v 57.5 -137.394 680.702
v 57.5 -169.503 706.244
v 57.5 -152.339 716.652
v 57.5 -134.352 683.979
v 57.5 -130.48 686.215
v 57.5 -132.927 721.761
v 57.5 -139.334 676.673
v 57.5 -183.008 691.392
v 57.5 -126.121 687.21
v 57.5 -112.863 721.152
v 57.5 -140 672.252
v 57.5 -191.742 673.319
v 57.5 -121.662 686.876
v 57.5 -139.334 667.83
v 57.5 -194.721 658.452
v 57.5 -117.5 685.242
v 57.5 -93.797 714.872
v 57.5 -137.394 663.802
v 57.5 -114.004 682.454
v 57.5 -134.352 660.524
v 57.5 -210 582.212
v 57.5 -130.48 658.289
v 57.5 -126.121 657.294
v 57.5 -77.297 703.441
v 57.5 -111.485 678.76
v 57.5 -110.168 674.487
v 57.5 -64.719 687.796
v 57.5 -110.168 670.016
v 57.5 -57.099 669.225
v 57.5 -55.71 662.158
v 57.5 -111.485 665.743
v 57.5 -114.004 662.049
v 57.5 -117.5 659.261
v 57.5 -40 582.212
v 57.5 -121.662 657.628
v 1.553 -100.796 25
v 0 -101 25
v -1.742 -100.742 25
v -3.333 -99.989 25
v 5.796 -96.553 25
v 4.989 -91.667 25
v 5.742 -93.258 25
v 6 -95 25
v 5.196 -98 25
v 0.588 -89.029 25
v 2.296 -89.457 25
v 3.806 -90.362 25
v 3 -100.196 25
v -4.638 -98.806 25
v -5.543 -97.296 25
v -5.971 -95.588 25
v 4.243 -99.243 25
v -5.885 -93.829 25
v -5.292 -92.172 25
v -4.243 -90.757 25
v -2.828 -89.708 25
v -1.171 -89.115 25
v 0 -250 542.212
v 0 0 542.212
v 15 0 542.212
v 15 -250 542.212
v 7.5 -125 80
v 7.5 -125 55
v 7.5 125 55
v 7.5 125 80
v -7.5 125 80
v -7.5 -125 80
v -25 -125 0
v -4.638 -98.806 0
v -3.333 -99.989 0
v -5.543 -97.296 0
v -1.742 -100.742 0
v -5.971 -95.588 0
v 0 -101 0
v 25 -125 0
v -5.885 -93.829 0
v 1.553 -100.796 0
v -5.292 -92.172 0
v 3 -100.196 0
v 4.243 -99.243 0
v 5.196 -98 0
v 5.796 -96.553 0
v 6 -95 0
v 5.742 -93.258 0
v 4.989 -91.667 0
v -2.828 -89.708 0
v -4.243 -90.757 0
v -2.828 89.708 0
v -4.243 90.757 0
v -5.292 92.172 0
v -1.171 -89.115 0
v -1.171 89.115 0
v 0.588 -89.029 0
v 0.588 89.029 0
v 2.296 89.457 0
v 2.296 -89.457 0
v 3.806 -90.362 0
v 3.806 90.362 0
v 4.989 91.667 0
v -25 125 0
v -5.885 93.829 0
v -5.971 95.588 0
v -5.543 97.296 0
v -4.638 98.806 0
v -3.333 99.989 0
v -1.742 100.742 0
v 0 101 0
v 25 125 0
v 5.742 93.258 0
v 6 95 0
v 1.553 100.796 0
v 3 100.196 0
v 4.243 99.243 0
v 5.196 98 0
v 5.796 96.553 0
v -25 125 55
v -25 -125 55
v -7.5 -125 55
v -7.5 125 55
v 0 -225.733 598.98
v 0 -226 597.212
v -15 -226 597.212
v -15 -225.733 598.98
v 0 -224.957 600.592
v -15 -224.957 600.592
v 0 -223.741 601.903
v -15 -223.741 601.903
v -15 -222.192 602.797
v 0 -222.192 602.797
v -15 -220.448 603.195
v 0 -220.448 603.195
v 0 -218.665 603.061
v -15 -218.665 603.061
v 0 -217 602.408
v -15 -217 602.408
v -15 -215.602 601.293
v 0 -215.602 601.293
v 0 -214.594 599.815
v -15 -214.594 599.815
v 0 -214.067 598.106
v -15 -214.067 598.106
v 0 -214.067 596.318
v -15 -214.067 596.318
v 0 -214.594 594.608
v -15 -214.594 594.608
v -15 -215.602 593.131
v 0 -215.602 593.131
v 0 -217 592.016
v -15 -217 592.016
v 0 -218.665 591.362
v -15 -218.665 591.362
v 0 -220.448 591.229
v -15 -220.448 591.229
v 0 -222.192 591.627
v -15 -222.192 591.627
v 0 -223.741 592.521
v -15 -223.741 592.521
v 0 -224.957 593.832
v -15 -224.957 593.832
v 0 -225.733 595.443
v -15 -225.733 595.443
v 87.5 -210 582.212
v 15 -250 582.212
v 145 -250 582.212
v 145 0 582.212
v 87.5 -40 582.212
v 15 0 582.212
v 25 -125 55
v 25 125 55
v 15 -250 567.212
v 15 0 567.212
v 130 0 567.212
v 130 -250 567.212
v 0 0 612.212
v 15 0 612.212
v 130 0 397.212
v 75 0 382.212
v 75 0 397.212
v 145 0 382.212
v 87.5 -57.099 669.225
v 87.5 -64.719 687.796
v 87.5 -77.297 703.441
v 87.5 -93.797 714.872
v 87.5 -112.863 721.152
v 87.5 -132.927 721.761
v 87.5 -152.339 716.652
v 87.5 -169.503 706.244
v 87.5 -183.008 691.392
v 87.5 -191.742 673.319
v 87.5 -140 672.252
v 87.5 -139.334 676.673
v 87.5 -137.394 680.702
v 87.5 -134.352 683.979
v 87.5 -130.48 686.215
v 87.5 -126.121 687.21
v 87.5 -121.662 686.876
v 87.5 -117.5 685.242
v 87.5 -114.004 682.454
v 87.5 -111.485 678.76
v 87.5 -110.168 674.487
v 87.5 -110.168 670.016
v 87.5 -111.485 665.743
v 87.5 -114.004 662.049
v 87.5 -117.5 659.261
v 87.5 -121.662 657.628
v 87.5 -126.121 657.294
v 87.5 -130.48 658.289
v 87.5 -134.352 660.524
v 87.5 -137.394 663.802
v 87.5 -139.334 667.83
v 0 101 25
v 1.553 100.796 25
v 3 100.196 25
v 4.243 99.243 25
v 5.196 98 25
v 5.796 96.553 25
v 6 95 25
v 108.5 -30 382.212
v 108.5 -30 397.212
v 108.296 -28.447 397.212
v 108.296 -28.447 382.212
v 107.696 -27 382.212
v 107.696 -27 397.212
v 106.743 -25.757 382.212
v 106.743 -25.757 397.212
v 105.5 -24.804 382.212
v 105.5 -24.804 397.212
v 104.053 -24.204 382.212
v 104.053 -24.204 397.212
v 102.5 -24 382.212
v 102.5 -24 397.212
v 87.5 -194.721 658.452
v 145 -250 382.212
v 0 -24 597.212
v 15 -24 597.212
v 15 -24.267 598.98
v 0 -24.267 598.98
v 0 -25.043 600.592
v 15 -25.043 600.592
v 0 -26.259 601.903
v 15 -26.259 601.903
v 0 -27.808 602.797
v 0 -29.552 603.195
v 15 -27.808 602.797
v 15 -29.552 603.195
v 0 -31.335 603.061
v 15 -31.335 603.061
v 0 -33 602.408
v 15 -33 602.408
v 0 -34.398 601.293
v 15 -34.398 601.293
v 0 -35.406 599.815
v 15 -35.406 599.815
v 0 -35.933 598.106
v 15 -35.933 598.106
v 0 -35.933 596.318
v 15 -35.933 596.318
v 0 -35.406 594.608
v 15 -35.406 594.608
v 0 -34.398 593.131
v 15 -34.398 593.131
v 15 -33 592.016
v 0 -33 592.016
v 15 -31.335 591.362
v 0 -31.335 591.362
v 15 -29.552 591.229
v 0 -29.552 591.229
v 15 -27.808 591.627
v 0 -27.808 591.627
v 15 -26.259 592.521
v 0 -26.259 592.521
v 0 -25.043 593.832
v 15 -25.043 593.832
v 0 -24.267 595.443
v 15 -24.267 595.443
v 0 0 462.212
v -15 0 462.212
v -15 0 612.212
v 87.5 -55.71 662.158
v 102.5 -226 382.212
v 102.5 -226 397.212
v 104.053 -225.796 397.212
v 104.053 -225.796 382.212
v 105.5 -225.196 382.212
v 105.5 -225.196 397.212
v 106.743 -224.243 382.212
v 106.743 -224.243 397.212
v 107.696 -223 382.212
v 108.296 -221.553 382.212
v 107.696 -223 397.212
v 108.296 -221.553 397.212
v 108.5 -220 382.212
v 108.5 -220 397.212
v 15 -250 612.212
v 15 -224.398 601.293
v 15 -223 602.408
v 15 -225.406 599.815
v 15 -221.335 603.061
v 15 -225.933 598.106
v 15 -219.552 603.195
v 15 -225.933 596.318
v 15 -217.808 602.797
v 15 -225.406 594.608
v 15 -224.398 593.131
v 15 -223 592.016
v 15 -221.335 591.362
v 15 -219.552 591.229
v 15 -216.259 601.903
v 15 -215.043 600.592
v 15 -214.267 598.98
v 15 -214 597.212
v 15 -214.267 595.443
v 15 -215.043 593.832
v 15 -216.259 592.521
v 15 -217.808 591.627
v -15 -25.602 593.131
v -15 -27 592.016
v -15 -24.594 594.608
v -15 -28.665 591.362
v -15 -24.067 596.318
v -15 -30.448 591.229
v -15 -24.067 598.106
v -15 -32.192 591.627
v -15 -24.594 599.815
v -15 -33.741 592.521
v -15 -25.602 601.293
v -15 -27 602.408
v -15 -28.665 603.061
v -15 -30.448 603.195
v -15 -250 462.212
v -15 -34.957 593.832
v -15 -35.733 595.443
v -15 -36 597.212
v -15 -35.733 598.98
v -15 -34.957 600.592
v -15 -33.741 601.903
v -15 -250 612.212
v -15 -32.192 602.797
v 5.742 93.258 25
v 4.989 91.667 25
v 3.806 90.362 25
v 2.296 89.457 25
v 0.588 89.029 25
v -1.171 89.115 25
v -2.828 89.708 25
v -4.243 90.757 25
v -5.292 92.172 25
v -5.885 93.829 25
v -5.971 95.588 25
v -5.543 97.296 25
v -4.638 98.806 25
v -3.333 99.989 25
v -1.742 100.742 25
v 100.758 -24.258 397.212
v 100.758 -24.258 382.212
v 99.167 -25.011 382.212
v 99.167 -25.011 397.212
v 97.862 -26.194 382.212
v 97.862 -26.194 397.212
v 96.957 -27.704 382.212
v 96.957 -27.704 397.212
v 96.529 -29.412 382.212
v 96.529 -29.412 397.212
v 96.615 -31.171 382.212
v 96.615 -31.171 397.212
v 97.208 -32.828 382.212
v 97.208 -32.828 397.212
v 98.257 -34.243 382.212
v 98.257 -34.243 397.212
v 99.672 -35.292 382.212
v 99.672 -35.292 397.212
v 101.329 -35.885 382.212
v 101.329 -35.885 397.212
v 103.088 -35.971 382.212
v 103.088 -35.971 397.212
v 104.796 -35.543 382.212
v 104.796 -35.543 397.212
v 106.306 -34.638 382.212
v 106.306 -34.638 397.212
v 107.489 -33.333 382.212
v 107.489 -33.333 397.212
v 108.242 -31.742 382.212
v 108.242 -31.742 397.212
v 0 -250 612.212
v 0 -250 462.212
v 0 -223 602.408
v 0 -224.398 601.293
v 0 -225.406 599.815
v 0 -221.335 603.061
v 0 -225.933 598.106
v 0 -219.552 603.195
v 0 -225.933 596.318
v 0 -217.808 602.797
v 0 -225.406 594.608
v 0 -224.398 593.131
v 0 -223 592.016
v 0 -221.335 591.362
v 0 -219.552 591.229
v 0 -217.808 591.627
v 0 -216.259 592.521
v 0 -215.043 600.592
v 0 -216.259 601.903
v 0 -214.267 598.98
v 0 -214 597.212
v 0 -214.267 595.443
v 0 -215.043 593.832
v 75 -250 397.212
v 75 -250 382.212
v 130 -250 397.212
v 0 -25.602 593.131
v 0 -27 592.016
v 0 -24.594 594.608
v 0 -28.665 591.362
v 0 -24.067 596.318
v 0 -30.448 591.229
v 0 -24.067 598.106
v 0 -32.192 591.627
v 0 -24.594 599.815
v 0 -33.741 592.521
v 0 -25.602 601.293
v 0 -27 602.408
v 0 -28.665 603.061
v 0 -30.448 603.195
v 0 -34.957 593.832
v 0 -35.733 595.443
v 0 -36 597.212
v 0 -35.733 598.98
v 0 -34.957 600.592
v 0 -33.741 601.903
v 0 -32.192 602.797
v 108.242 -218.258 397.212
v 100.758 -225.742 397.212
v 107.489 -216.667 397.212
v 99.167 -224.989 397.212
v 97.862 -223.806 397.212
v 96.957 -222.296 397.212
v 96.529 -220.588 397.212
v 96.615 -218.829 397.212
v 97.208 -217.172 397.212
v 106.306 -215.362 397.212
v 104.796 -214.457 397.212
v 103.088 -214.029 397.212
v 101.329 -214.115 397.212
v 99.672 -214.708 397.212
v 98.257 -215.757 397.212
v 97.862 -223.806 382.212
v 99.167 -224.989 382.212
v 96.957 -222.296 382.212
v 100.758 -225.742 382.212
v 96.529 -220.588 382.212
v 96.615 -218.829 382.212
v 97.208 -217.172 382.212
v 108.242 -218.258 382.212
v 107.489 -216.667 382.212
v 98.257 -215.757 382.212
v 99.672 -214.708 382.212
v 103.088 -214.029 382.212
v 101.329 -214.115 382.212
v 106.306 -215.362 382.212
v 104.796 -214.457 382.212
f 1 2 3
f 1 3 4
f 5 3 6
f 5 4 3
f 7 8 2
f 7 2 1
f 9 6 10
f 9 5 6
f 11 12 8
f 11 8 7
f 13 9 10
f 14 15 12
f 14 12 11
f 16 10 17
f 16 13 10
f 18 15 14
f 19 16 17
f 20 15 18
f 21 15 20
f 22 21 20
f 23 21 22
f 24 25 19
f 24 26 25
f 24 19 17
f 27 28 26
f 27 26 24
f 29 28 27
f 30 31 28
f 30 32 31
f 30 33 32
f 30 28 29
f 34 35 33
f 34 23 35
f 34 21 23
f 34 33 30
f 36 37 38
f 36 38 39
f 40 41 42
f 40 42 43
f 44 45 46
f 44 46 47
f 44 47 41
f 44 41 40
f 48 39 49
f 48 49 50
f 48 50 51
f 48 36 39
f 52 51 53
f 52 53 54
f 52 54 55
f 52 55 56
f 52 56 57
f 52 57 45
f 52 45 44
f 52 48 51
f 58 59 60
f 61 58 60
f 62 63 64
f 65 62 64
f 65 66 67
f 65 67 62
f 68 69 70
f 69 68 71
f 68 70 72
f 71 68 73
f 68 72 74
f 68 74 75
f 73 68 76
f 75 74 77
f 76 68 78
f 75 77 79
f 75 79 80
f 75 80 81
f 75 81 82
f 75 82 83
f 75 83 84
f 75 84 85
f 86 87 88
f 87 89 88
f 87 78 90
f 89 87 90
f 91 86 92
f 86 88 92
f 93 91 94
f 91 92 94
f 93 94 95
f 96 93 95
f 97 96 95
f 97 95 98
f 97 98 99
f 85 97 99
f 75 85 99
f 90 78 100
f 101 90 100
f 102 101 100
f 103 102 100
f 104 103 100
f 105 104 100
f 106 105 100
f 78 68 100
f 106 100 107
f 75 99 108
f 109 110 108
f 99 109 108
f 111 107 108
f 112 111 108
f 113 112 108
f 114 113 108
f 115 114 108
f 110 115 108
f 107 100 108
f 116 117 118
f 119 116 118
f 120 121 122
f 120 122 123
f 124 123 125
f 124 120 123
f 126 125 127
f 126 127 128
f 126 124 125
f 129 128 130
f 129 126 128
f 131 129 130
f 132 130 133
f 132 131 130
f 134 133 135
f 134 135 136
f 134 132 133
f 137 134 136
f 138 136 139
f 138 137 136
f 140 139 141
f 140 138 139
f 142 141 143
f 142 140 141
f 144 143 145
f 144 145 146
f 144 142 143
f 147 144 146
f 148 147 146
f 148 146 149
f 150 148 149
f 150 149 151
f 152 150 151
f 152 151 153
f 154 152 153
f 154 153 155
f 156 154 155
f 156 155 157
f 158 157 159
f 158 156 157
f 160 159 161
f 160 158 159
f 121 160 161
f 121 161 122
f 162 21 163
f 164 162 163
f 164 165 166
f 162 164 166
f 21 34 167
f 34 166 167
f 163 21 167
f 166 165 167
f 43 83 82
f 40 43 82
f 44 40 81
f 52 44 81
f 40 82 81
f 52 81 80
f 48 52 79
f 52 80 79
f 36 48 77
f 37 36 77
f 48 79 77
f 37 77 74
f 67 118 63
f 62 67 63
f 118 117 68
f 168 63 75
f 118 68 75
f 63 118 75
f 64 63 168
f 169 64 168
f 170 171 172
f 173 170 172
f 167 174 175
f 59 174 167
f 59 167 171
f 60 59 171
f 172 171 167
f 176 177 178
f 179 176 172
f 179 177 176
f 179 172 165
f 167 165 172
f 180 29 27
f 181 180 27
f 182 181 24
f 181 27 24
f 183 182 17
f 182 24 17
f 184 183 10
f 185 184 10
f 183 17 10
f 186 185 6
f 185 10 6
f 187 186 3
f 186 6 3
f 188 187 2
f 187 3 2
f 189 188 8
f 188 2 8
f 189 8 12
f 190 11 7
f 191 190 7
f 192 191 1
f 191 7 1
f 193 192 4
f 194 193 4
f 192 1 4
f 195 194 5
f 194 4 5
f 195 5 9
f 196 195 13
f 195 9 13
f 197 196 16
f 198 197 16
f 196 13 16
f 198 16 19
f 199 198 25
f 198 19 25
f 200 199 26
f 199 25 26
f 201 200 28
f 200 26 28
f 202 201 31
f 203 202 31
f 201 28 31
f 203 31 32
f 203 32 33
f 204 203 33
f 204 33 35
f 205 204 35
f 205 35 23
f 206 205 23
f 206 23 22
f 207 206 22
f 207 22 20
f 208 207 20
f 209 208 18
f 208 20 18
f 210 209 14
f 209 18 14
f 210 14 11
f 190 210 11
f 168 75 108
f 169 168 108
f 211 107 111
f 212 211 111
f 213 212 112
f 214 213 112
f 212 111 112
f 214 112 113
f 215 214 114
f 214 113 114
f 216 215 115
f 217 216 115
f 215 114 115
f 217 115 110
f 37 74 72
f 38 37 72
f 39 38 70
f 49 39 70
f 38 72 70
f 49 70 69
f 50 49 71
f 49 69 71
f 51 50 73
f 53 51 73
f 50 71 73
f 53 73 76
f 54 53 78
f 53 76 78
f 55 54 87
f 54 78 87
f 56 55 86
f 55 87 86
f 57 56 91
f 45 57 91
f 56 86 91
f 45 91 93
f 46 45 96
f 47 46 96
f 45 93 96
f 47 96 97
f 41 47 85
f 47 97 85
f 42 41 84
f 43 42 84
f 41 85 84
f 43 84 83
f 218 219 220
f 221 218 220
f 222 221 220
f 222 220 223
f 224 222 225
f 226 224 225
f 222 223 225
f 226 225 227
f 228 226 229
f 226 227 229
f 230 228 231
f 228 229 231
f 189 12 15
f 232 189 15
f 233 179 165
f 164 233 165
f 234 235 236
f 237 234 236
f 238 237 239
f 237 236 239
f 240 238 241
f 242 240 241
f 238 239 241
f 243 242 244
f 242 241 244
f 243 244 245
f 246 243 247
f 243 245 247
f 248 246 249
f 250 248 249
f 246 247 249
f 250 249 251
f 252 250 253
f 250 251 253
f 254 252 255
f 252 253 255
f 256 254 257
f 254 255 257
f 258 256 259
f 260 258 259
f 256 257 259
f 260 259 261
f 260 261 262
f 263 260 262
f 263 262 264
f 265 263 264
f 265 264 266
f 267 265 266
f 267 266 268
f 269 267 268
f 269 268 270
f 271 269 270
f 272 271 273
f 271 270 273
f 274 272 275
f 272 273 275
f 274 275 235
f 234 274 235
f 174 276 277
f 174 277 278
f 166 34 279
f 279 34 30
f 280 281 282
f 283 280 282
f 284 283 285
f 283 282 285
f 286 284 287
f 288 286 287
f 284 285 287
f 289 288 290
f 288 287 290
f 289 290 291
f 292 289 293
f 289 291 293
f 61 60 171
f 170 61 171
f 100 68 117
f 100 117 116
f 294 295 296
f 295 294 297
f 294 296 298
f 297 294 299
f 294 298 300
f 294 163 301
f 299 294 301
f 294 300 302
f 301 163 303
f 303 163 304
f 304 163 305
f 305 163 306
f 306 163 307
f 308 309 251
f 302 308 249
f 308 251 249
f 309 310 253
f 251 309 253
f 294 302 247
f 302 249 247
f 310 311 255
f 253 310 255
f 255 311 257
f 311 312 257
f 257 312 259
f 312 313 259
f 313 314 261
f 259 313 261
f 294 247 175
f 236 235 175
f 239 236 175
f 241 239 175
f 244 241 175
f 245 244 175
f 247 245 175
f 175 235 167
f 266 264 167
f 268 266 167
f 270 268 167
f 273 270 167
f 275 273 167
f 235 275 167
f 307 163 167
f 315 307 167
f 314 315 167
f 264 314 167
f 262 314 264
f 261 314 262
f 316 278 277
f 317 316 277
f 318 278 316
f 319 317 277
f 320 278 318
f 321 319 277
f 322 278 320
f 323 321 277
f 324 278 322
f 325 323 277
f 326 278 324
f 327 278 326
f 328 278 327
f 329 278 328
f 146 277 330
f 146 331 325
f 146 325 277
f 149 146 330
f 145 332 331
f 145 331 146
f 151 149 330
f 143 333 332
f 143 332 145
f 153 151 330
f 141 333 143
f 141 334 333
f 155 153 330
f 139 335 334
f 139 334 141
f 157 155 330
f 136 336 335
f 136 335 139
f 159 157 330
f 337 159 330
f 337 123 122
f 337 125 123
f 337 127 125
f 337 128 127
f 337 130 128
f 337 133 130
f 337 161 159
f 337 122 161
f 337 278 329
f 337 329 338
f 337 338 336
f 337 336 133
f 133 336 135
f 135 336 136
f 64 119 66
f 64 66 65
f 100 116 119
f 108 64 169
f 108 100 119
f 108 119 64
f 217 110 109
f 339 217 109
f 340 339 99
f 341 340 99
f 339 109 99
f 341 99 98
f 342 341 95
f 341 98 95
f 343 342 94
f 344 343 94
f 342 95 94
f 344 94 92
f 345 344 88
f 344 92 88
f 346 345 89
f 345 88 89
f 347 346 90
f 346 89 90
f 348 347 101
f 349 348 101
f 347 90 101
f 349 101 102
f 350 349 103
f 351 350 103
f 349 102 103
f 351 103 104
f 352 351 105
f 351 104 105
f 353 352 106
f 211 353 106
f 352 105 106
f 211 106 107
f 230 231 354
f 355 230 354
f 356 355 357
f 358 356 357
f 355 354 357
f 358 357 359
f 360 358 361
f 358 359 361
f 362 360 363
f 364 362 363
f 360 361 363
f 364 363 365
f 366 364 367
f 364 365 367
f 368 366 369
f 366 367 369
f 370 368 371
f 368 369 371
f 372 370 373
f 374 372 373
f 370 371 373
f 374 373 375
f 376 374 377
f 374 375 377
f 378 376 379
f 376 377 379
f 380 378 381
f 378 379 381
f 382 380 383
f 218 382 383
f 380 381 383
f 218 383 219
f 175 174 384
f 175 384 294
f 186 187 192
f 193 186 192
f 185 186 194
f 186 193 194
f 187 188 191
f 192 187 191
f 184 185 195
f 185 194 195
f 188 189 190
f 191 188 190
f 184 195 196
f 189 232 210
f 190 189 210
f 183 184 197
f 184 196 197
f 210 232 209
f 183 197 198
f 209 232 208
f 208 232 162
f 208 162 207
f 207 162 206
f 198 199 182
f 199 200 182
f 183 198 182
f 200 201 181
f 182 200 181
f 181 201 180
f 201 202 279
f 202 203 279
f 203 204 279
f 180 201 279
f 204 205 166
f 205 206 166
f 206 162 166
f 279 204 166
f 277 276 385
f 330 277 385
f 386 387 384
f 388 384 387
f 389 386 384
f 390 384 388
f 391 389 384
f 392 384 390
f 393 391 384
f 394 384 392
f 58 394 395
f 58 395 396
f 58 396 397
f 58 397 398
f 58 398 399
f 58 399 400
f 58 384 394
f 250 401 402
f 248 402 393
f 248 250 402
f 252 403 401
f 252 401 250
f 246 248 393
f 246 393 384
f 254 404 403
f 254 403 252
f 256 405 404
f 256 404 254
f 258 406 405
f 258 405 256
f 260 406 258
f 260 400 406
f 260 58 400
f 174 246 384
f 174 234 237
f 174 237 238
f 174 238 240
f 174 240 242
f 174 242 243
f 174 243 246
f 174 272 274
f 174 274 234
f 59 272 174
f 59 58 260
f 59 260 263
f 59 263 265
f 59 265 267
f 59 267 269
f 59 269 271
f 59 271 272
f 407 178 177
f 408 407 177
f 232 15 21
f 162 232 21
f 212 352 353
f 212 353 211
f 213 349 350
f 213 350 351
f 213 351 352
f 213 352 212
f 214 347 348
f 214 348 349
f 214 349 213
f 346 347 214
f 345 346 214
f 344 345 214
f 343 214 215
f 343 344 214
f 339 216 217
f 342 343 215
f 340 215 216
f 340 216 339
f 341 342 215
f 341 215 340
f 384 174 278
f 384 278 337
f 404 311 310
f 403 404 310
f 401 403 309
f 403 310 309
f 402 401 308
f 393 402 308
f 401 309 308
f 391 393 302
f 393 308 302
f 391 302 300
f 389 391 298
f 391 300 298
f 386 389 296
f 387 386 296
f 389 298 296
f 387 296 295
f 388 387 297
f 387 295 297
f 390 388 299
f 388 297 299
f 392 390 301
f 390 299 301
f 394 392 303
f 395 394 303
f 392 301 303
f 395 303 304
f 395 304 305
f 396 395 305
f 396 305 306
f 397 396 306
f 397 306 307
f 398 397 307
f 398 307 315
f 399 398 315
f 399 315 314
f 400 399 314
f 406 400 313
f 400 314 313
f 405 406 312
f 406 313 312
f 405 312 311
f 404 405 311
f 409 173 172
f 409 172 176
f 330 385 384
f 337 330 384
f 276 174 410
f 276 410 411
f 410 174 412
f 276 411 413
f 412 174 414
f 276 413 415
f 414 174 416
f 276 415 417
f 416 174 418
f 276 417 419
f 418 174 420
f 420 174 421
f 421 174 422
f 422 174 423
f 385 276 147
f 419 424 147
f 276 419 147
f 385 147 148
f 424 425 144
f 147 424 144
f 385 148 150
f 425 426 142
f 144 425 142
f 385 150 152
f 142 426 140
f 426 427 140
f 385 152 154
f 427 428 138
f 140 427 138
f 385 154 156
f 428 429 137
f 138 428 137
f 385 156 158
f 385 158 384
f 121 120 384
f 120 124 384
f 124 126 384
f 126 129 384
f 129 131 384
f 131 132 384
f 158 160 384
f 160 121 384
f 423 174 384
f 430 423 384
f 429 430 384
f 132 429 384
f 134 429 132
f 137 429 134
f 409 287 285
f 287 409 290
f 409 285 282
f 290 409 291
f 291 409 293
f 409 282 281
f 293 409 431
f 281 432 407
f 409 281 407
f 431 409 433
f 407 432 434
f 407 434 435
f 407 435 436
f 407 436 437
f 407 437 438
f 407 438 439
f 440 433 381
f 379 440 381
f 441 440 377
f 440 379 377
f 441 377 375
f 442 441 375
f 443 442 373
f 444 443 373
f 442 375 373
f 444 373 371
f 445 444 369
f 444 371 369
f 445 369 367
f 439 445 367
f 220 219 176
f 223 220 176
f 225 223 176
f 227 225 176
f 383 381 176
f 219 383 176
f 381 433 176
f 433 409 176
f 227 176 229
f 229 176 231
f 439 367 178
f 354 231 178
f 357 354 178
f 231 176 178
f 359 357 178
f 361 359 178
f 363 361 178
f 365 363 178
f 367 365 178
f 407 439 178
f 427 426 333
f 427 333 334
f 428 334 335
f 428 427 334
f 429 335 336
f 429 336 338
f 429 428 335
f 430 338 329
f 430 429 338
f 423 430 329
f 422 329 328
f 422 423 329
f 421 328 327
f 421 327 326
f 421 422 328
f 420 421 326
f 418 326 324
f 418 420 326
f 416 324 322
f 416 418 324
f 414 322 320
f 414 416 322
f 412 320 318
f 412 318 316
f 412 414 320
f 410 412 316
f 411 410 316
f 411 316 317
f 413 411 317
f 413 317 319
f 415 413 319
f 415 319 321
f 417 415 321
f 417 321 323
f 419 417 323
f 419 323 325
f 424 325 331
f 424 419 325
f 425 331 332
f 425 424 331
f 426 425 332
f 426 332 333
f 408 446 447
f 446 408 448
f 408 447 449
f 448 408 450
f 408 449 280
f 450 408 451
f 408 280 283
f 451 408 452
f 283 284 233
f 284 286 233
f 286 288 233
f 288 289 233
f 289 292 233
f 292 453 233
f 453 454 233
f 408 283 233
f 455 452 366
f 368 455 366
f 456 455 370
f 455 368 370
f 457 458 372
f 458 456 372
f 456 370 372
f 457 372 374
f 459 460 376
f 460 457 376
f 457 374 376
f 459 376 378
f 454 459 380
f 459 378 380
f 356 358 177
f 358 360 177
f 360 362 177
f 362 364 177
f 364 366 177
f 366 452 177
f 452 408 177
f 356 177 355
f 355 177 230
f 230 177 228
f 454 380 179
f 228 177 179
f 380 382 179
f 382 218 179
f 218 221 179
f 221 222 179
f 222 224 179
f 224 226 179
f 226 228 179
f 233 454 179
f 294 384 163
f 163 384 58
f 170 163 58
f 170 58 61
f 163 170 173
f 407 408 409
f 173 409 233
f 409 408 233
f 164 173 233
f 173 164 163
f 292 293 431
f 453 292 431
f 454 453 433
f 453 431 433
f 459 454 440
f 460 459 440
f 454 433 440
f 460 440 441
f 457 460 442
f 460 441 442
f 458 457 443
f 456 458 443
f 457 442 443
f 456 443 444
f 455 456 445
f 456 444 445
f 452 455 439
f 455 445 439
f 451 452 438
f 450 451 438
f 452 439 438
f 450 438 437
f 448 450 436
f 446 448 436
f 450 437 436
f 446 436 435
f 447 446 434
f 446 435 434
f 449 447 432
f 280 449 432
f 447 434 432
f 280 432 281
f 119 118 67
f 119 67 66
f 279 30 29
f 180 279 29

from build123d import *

# Parameters (mm, degrees)
F1_DEPTH  = 250
F3_DEPTH  = 15
F4_W      = 50
F4_H      = 250
F5_DEPTH  = 55
F6_W      = 15
F6_H      = 250
F7_DEPTH  = 25
F9_DEPTH  = 25
F10_W     = 30
F10_H     = 170
F11_DEPTH = 140
F12_R     = 15
F13_DEPTH = 30
F14_W     = 15
F14_H     = 250
F15_DEPTH = 30
F16_R     = 6
F17_DEPTH = 15
F18_W     = 250
F18_H     = 150
F18_R     = 6
F19_DEPTH = 15


with BuildPart() as f1:
    # F0 (on Front) → F1 (new body)
    with BuildSketch(Plane.XZ):
        Polygon((130, 397.2117710114), (75, 397.2117710114), (75, 382.2117710114), (145, 382.2117710114), (145, 582.2117710114), (0, 582.2117710114), (0, 542.2117710114), (15, 542.2117710114), (15, 567.2117710114), (130, 567.2117710114), align=None)
    extrude(amount=F1_DEPTH)

    # F2 (on face) → F3 (cut)
    with BuildSketch(Plane.XY.offset(397.2117710114)):
        with BuildLine():
            ThreePointArc((102.5, -226), (106.7426406871, -224.2426406871), (108.5, -220))
            ThreePointArc((108.5, -220), (98.2573593129, -215.7573593129), (102.5, -226))
        make_face()
        with BuildLine():
            ThreePointArc((102.5, -24), (98.2573593129, -34.2426406871), (108.5, -30))
            ThreePointArc((108.5, -30), (106.7426406871, -25.7573593129), (102.5, -24))
        make_face()
    extrude(amount=-F3_DEPTH, mode=Mode.SUBTRACT)

    # F10 (on face) → F11 (join)
    with BuildSketch(Plane.XY.offset(582.2117710114)):
        with Locations((72.5, -125)):
            Rectangle(F10_W, F10_H)
    extrude(amount=F11_DEPTH)

    # F12 (on face) → F13 (cut)
    with BuildSketch(Plane(origin=(57.5, 0, 0), x_dir=(0, -1, 0), z_dir=(-1, 0, 0))):
        with BuildLine():
            Line((191.7420676429, 673.31855681), (194.7212601627, 658.4524345433))
            ThreePointArc((194.7212601627, 658.4524345433), (193.6353433499, 665.9663936248), (191.7420676429, 673.31855681))
        make_face()
        with BuildLine():
            ThreePointArc((57.0990775302, 669.225433984), (56.3136439692, 665.7093446902), (55.7101562172, 662.1575011781))
            Line((55.7101562172, 662.1575011781), (57.0990775302, 669.225433984))
        make_face()
        with BuildLine():
            Line((40, 582.2117710114), (55.7101562172, 662.1575011781))
            ThreePointArc((55.7101562172, 662.1575011781), (56.3136439692, 665.7093446902), (57.0990775302, 669.225433984))
            ThreePointArc((57.0990775302, 669.225433984), (81.9358409352, 707.3976224956), (125, 722.2117710114))
            Line((125, 722.2117710114), (40, 722.2117710114))
            Line((40, 722.2117710114), (40, 582.2117710114))
        make_face()
        with Locations((125, 672.251701355)):
            Circle(F12_R)
        with BuildLine():
            ThreePointArc((191.7420676429, 673.31855681), (193.6353433499, 665.9663936248), (194.7212601627, 658.4524345433))
            Line((194.7212601627, 658.4524345433), (210, 582.2117710114))
            Line((210, 582.2117710114), (210, 585.6798887253))
            Line((210, 585.6798887253), (210, 722.2117710114))
            Line((210, 722.2117710114), (125, 722.2117710114))
            ThreePointArc((125, 722.2117710114), (166.3674086335, 708.6806784114), (191.7420676429, 673.31855681))
        make_face()
    extrude(amount=-F13_DEPTH, mode=Mode.SUBTRACT)

    # F14 (on face) → F15 (join)
    with BuildSketch(Plane.XY.offset(582.2117710114)):
        with Locations((7.5, -125)):
            Rectangle(F14_W, F14_H)
    extrude(amount=F15_DEPTH)

    # F16 (on face) → F17 (cut)
    with BuildSketch(Plane.YZ.offset(15)):
        with Locations((-220, 597.2117710114)):
            Circle(F16_R)
        with Locations((-30, 597.2117710114)):
            Circle(F16_R)
    extrude(amount=-F17_DEPTH, mode=Mode.SUBTRACT)


with BuildPart() as f5:
    # F4 (on Top) → F5 (new body)
    with BuildSketch(Plane.XY):
        Rectangle(F4_W, F4_H)
    extrude(amount=F5_DEPTH)

    # F6 (on face) → F7 (join)
    with BuildSketch(Plane.XY.offset(55)):
        Rectangle(F6_W, F6_H)
    extrude(amount=F7_DEPTH)

    # F8 (on face) → F9 (cut)
    with BuildSketch(Plane(origin=(0, 0, 0), x_dir=(1, 0, 0), z_dir=(0, 0, -1))):
        with BuildLine():
            ThreePointArc((0, 101), (-4.2426406871, 90.7573593129), (6, 95))
            ThreePointArc((6, 95), (4.2426406871, 99.2426406871), (0, 101))
        make_face()
        with BuildLine():
            ThreePointArc((0, -101), (4.2426406871, -99.2426406871), (6, -95))
            ThreePointArc((6, -95), (-4.2426406871, -90.7573593129), (0, -101))
        make_face()
    extrude(amount=-F9_DEPTH, mode=Mode.SUBTRACT)


with BuildPart() as f19:
    # F18 (on face) → F19 (new body)
    with BuildSketch(Plane(origin=(0, 0, 0), x_dir=(0, -1, 0), z_dir=(-1, 0, 0))):
        with Locations((125, 537.2117710114)):
            Rectangle(F18_W, F18_H)
        with Locations((30, 597.2117710114)):
            Circle(F18_R, mode=Mode.SUBTRACT)
        with Locations((220, 597.2117710114)):
            Circle(F18_R, mode=Mode.SUBTRACT)
    extrude(amount=F19_DEPTH)


solid = Compound([f1.part, f5.part, f19.part])
